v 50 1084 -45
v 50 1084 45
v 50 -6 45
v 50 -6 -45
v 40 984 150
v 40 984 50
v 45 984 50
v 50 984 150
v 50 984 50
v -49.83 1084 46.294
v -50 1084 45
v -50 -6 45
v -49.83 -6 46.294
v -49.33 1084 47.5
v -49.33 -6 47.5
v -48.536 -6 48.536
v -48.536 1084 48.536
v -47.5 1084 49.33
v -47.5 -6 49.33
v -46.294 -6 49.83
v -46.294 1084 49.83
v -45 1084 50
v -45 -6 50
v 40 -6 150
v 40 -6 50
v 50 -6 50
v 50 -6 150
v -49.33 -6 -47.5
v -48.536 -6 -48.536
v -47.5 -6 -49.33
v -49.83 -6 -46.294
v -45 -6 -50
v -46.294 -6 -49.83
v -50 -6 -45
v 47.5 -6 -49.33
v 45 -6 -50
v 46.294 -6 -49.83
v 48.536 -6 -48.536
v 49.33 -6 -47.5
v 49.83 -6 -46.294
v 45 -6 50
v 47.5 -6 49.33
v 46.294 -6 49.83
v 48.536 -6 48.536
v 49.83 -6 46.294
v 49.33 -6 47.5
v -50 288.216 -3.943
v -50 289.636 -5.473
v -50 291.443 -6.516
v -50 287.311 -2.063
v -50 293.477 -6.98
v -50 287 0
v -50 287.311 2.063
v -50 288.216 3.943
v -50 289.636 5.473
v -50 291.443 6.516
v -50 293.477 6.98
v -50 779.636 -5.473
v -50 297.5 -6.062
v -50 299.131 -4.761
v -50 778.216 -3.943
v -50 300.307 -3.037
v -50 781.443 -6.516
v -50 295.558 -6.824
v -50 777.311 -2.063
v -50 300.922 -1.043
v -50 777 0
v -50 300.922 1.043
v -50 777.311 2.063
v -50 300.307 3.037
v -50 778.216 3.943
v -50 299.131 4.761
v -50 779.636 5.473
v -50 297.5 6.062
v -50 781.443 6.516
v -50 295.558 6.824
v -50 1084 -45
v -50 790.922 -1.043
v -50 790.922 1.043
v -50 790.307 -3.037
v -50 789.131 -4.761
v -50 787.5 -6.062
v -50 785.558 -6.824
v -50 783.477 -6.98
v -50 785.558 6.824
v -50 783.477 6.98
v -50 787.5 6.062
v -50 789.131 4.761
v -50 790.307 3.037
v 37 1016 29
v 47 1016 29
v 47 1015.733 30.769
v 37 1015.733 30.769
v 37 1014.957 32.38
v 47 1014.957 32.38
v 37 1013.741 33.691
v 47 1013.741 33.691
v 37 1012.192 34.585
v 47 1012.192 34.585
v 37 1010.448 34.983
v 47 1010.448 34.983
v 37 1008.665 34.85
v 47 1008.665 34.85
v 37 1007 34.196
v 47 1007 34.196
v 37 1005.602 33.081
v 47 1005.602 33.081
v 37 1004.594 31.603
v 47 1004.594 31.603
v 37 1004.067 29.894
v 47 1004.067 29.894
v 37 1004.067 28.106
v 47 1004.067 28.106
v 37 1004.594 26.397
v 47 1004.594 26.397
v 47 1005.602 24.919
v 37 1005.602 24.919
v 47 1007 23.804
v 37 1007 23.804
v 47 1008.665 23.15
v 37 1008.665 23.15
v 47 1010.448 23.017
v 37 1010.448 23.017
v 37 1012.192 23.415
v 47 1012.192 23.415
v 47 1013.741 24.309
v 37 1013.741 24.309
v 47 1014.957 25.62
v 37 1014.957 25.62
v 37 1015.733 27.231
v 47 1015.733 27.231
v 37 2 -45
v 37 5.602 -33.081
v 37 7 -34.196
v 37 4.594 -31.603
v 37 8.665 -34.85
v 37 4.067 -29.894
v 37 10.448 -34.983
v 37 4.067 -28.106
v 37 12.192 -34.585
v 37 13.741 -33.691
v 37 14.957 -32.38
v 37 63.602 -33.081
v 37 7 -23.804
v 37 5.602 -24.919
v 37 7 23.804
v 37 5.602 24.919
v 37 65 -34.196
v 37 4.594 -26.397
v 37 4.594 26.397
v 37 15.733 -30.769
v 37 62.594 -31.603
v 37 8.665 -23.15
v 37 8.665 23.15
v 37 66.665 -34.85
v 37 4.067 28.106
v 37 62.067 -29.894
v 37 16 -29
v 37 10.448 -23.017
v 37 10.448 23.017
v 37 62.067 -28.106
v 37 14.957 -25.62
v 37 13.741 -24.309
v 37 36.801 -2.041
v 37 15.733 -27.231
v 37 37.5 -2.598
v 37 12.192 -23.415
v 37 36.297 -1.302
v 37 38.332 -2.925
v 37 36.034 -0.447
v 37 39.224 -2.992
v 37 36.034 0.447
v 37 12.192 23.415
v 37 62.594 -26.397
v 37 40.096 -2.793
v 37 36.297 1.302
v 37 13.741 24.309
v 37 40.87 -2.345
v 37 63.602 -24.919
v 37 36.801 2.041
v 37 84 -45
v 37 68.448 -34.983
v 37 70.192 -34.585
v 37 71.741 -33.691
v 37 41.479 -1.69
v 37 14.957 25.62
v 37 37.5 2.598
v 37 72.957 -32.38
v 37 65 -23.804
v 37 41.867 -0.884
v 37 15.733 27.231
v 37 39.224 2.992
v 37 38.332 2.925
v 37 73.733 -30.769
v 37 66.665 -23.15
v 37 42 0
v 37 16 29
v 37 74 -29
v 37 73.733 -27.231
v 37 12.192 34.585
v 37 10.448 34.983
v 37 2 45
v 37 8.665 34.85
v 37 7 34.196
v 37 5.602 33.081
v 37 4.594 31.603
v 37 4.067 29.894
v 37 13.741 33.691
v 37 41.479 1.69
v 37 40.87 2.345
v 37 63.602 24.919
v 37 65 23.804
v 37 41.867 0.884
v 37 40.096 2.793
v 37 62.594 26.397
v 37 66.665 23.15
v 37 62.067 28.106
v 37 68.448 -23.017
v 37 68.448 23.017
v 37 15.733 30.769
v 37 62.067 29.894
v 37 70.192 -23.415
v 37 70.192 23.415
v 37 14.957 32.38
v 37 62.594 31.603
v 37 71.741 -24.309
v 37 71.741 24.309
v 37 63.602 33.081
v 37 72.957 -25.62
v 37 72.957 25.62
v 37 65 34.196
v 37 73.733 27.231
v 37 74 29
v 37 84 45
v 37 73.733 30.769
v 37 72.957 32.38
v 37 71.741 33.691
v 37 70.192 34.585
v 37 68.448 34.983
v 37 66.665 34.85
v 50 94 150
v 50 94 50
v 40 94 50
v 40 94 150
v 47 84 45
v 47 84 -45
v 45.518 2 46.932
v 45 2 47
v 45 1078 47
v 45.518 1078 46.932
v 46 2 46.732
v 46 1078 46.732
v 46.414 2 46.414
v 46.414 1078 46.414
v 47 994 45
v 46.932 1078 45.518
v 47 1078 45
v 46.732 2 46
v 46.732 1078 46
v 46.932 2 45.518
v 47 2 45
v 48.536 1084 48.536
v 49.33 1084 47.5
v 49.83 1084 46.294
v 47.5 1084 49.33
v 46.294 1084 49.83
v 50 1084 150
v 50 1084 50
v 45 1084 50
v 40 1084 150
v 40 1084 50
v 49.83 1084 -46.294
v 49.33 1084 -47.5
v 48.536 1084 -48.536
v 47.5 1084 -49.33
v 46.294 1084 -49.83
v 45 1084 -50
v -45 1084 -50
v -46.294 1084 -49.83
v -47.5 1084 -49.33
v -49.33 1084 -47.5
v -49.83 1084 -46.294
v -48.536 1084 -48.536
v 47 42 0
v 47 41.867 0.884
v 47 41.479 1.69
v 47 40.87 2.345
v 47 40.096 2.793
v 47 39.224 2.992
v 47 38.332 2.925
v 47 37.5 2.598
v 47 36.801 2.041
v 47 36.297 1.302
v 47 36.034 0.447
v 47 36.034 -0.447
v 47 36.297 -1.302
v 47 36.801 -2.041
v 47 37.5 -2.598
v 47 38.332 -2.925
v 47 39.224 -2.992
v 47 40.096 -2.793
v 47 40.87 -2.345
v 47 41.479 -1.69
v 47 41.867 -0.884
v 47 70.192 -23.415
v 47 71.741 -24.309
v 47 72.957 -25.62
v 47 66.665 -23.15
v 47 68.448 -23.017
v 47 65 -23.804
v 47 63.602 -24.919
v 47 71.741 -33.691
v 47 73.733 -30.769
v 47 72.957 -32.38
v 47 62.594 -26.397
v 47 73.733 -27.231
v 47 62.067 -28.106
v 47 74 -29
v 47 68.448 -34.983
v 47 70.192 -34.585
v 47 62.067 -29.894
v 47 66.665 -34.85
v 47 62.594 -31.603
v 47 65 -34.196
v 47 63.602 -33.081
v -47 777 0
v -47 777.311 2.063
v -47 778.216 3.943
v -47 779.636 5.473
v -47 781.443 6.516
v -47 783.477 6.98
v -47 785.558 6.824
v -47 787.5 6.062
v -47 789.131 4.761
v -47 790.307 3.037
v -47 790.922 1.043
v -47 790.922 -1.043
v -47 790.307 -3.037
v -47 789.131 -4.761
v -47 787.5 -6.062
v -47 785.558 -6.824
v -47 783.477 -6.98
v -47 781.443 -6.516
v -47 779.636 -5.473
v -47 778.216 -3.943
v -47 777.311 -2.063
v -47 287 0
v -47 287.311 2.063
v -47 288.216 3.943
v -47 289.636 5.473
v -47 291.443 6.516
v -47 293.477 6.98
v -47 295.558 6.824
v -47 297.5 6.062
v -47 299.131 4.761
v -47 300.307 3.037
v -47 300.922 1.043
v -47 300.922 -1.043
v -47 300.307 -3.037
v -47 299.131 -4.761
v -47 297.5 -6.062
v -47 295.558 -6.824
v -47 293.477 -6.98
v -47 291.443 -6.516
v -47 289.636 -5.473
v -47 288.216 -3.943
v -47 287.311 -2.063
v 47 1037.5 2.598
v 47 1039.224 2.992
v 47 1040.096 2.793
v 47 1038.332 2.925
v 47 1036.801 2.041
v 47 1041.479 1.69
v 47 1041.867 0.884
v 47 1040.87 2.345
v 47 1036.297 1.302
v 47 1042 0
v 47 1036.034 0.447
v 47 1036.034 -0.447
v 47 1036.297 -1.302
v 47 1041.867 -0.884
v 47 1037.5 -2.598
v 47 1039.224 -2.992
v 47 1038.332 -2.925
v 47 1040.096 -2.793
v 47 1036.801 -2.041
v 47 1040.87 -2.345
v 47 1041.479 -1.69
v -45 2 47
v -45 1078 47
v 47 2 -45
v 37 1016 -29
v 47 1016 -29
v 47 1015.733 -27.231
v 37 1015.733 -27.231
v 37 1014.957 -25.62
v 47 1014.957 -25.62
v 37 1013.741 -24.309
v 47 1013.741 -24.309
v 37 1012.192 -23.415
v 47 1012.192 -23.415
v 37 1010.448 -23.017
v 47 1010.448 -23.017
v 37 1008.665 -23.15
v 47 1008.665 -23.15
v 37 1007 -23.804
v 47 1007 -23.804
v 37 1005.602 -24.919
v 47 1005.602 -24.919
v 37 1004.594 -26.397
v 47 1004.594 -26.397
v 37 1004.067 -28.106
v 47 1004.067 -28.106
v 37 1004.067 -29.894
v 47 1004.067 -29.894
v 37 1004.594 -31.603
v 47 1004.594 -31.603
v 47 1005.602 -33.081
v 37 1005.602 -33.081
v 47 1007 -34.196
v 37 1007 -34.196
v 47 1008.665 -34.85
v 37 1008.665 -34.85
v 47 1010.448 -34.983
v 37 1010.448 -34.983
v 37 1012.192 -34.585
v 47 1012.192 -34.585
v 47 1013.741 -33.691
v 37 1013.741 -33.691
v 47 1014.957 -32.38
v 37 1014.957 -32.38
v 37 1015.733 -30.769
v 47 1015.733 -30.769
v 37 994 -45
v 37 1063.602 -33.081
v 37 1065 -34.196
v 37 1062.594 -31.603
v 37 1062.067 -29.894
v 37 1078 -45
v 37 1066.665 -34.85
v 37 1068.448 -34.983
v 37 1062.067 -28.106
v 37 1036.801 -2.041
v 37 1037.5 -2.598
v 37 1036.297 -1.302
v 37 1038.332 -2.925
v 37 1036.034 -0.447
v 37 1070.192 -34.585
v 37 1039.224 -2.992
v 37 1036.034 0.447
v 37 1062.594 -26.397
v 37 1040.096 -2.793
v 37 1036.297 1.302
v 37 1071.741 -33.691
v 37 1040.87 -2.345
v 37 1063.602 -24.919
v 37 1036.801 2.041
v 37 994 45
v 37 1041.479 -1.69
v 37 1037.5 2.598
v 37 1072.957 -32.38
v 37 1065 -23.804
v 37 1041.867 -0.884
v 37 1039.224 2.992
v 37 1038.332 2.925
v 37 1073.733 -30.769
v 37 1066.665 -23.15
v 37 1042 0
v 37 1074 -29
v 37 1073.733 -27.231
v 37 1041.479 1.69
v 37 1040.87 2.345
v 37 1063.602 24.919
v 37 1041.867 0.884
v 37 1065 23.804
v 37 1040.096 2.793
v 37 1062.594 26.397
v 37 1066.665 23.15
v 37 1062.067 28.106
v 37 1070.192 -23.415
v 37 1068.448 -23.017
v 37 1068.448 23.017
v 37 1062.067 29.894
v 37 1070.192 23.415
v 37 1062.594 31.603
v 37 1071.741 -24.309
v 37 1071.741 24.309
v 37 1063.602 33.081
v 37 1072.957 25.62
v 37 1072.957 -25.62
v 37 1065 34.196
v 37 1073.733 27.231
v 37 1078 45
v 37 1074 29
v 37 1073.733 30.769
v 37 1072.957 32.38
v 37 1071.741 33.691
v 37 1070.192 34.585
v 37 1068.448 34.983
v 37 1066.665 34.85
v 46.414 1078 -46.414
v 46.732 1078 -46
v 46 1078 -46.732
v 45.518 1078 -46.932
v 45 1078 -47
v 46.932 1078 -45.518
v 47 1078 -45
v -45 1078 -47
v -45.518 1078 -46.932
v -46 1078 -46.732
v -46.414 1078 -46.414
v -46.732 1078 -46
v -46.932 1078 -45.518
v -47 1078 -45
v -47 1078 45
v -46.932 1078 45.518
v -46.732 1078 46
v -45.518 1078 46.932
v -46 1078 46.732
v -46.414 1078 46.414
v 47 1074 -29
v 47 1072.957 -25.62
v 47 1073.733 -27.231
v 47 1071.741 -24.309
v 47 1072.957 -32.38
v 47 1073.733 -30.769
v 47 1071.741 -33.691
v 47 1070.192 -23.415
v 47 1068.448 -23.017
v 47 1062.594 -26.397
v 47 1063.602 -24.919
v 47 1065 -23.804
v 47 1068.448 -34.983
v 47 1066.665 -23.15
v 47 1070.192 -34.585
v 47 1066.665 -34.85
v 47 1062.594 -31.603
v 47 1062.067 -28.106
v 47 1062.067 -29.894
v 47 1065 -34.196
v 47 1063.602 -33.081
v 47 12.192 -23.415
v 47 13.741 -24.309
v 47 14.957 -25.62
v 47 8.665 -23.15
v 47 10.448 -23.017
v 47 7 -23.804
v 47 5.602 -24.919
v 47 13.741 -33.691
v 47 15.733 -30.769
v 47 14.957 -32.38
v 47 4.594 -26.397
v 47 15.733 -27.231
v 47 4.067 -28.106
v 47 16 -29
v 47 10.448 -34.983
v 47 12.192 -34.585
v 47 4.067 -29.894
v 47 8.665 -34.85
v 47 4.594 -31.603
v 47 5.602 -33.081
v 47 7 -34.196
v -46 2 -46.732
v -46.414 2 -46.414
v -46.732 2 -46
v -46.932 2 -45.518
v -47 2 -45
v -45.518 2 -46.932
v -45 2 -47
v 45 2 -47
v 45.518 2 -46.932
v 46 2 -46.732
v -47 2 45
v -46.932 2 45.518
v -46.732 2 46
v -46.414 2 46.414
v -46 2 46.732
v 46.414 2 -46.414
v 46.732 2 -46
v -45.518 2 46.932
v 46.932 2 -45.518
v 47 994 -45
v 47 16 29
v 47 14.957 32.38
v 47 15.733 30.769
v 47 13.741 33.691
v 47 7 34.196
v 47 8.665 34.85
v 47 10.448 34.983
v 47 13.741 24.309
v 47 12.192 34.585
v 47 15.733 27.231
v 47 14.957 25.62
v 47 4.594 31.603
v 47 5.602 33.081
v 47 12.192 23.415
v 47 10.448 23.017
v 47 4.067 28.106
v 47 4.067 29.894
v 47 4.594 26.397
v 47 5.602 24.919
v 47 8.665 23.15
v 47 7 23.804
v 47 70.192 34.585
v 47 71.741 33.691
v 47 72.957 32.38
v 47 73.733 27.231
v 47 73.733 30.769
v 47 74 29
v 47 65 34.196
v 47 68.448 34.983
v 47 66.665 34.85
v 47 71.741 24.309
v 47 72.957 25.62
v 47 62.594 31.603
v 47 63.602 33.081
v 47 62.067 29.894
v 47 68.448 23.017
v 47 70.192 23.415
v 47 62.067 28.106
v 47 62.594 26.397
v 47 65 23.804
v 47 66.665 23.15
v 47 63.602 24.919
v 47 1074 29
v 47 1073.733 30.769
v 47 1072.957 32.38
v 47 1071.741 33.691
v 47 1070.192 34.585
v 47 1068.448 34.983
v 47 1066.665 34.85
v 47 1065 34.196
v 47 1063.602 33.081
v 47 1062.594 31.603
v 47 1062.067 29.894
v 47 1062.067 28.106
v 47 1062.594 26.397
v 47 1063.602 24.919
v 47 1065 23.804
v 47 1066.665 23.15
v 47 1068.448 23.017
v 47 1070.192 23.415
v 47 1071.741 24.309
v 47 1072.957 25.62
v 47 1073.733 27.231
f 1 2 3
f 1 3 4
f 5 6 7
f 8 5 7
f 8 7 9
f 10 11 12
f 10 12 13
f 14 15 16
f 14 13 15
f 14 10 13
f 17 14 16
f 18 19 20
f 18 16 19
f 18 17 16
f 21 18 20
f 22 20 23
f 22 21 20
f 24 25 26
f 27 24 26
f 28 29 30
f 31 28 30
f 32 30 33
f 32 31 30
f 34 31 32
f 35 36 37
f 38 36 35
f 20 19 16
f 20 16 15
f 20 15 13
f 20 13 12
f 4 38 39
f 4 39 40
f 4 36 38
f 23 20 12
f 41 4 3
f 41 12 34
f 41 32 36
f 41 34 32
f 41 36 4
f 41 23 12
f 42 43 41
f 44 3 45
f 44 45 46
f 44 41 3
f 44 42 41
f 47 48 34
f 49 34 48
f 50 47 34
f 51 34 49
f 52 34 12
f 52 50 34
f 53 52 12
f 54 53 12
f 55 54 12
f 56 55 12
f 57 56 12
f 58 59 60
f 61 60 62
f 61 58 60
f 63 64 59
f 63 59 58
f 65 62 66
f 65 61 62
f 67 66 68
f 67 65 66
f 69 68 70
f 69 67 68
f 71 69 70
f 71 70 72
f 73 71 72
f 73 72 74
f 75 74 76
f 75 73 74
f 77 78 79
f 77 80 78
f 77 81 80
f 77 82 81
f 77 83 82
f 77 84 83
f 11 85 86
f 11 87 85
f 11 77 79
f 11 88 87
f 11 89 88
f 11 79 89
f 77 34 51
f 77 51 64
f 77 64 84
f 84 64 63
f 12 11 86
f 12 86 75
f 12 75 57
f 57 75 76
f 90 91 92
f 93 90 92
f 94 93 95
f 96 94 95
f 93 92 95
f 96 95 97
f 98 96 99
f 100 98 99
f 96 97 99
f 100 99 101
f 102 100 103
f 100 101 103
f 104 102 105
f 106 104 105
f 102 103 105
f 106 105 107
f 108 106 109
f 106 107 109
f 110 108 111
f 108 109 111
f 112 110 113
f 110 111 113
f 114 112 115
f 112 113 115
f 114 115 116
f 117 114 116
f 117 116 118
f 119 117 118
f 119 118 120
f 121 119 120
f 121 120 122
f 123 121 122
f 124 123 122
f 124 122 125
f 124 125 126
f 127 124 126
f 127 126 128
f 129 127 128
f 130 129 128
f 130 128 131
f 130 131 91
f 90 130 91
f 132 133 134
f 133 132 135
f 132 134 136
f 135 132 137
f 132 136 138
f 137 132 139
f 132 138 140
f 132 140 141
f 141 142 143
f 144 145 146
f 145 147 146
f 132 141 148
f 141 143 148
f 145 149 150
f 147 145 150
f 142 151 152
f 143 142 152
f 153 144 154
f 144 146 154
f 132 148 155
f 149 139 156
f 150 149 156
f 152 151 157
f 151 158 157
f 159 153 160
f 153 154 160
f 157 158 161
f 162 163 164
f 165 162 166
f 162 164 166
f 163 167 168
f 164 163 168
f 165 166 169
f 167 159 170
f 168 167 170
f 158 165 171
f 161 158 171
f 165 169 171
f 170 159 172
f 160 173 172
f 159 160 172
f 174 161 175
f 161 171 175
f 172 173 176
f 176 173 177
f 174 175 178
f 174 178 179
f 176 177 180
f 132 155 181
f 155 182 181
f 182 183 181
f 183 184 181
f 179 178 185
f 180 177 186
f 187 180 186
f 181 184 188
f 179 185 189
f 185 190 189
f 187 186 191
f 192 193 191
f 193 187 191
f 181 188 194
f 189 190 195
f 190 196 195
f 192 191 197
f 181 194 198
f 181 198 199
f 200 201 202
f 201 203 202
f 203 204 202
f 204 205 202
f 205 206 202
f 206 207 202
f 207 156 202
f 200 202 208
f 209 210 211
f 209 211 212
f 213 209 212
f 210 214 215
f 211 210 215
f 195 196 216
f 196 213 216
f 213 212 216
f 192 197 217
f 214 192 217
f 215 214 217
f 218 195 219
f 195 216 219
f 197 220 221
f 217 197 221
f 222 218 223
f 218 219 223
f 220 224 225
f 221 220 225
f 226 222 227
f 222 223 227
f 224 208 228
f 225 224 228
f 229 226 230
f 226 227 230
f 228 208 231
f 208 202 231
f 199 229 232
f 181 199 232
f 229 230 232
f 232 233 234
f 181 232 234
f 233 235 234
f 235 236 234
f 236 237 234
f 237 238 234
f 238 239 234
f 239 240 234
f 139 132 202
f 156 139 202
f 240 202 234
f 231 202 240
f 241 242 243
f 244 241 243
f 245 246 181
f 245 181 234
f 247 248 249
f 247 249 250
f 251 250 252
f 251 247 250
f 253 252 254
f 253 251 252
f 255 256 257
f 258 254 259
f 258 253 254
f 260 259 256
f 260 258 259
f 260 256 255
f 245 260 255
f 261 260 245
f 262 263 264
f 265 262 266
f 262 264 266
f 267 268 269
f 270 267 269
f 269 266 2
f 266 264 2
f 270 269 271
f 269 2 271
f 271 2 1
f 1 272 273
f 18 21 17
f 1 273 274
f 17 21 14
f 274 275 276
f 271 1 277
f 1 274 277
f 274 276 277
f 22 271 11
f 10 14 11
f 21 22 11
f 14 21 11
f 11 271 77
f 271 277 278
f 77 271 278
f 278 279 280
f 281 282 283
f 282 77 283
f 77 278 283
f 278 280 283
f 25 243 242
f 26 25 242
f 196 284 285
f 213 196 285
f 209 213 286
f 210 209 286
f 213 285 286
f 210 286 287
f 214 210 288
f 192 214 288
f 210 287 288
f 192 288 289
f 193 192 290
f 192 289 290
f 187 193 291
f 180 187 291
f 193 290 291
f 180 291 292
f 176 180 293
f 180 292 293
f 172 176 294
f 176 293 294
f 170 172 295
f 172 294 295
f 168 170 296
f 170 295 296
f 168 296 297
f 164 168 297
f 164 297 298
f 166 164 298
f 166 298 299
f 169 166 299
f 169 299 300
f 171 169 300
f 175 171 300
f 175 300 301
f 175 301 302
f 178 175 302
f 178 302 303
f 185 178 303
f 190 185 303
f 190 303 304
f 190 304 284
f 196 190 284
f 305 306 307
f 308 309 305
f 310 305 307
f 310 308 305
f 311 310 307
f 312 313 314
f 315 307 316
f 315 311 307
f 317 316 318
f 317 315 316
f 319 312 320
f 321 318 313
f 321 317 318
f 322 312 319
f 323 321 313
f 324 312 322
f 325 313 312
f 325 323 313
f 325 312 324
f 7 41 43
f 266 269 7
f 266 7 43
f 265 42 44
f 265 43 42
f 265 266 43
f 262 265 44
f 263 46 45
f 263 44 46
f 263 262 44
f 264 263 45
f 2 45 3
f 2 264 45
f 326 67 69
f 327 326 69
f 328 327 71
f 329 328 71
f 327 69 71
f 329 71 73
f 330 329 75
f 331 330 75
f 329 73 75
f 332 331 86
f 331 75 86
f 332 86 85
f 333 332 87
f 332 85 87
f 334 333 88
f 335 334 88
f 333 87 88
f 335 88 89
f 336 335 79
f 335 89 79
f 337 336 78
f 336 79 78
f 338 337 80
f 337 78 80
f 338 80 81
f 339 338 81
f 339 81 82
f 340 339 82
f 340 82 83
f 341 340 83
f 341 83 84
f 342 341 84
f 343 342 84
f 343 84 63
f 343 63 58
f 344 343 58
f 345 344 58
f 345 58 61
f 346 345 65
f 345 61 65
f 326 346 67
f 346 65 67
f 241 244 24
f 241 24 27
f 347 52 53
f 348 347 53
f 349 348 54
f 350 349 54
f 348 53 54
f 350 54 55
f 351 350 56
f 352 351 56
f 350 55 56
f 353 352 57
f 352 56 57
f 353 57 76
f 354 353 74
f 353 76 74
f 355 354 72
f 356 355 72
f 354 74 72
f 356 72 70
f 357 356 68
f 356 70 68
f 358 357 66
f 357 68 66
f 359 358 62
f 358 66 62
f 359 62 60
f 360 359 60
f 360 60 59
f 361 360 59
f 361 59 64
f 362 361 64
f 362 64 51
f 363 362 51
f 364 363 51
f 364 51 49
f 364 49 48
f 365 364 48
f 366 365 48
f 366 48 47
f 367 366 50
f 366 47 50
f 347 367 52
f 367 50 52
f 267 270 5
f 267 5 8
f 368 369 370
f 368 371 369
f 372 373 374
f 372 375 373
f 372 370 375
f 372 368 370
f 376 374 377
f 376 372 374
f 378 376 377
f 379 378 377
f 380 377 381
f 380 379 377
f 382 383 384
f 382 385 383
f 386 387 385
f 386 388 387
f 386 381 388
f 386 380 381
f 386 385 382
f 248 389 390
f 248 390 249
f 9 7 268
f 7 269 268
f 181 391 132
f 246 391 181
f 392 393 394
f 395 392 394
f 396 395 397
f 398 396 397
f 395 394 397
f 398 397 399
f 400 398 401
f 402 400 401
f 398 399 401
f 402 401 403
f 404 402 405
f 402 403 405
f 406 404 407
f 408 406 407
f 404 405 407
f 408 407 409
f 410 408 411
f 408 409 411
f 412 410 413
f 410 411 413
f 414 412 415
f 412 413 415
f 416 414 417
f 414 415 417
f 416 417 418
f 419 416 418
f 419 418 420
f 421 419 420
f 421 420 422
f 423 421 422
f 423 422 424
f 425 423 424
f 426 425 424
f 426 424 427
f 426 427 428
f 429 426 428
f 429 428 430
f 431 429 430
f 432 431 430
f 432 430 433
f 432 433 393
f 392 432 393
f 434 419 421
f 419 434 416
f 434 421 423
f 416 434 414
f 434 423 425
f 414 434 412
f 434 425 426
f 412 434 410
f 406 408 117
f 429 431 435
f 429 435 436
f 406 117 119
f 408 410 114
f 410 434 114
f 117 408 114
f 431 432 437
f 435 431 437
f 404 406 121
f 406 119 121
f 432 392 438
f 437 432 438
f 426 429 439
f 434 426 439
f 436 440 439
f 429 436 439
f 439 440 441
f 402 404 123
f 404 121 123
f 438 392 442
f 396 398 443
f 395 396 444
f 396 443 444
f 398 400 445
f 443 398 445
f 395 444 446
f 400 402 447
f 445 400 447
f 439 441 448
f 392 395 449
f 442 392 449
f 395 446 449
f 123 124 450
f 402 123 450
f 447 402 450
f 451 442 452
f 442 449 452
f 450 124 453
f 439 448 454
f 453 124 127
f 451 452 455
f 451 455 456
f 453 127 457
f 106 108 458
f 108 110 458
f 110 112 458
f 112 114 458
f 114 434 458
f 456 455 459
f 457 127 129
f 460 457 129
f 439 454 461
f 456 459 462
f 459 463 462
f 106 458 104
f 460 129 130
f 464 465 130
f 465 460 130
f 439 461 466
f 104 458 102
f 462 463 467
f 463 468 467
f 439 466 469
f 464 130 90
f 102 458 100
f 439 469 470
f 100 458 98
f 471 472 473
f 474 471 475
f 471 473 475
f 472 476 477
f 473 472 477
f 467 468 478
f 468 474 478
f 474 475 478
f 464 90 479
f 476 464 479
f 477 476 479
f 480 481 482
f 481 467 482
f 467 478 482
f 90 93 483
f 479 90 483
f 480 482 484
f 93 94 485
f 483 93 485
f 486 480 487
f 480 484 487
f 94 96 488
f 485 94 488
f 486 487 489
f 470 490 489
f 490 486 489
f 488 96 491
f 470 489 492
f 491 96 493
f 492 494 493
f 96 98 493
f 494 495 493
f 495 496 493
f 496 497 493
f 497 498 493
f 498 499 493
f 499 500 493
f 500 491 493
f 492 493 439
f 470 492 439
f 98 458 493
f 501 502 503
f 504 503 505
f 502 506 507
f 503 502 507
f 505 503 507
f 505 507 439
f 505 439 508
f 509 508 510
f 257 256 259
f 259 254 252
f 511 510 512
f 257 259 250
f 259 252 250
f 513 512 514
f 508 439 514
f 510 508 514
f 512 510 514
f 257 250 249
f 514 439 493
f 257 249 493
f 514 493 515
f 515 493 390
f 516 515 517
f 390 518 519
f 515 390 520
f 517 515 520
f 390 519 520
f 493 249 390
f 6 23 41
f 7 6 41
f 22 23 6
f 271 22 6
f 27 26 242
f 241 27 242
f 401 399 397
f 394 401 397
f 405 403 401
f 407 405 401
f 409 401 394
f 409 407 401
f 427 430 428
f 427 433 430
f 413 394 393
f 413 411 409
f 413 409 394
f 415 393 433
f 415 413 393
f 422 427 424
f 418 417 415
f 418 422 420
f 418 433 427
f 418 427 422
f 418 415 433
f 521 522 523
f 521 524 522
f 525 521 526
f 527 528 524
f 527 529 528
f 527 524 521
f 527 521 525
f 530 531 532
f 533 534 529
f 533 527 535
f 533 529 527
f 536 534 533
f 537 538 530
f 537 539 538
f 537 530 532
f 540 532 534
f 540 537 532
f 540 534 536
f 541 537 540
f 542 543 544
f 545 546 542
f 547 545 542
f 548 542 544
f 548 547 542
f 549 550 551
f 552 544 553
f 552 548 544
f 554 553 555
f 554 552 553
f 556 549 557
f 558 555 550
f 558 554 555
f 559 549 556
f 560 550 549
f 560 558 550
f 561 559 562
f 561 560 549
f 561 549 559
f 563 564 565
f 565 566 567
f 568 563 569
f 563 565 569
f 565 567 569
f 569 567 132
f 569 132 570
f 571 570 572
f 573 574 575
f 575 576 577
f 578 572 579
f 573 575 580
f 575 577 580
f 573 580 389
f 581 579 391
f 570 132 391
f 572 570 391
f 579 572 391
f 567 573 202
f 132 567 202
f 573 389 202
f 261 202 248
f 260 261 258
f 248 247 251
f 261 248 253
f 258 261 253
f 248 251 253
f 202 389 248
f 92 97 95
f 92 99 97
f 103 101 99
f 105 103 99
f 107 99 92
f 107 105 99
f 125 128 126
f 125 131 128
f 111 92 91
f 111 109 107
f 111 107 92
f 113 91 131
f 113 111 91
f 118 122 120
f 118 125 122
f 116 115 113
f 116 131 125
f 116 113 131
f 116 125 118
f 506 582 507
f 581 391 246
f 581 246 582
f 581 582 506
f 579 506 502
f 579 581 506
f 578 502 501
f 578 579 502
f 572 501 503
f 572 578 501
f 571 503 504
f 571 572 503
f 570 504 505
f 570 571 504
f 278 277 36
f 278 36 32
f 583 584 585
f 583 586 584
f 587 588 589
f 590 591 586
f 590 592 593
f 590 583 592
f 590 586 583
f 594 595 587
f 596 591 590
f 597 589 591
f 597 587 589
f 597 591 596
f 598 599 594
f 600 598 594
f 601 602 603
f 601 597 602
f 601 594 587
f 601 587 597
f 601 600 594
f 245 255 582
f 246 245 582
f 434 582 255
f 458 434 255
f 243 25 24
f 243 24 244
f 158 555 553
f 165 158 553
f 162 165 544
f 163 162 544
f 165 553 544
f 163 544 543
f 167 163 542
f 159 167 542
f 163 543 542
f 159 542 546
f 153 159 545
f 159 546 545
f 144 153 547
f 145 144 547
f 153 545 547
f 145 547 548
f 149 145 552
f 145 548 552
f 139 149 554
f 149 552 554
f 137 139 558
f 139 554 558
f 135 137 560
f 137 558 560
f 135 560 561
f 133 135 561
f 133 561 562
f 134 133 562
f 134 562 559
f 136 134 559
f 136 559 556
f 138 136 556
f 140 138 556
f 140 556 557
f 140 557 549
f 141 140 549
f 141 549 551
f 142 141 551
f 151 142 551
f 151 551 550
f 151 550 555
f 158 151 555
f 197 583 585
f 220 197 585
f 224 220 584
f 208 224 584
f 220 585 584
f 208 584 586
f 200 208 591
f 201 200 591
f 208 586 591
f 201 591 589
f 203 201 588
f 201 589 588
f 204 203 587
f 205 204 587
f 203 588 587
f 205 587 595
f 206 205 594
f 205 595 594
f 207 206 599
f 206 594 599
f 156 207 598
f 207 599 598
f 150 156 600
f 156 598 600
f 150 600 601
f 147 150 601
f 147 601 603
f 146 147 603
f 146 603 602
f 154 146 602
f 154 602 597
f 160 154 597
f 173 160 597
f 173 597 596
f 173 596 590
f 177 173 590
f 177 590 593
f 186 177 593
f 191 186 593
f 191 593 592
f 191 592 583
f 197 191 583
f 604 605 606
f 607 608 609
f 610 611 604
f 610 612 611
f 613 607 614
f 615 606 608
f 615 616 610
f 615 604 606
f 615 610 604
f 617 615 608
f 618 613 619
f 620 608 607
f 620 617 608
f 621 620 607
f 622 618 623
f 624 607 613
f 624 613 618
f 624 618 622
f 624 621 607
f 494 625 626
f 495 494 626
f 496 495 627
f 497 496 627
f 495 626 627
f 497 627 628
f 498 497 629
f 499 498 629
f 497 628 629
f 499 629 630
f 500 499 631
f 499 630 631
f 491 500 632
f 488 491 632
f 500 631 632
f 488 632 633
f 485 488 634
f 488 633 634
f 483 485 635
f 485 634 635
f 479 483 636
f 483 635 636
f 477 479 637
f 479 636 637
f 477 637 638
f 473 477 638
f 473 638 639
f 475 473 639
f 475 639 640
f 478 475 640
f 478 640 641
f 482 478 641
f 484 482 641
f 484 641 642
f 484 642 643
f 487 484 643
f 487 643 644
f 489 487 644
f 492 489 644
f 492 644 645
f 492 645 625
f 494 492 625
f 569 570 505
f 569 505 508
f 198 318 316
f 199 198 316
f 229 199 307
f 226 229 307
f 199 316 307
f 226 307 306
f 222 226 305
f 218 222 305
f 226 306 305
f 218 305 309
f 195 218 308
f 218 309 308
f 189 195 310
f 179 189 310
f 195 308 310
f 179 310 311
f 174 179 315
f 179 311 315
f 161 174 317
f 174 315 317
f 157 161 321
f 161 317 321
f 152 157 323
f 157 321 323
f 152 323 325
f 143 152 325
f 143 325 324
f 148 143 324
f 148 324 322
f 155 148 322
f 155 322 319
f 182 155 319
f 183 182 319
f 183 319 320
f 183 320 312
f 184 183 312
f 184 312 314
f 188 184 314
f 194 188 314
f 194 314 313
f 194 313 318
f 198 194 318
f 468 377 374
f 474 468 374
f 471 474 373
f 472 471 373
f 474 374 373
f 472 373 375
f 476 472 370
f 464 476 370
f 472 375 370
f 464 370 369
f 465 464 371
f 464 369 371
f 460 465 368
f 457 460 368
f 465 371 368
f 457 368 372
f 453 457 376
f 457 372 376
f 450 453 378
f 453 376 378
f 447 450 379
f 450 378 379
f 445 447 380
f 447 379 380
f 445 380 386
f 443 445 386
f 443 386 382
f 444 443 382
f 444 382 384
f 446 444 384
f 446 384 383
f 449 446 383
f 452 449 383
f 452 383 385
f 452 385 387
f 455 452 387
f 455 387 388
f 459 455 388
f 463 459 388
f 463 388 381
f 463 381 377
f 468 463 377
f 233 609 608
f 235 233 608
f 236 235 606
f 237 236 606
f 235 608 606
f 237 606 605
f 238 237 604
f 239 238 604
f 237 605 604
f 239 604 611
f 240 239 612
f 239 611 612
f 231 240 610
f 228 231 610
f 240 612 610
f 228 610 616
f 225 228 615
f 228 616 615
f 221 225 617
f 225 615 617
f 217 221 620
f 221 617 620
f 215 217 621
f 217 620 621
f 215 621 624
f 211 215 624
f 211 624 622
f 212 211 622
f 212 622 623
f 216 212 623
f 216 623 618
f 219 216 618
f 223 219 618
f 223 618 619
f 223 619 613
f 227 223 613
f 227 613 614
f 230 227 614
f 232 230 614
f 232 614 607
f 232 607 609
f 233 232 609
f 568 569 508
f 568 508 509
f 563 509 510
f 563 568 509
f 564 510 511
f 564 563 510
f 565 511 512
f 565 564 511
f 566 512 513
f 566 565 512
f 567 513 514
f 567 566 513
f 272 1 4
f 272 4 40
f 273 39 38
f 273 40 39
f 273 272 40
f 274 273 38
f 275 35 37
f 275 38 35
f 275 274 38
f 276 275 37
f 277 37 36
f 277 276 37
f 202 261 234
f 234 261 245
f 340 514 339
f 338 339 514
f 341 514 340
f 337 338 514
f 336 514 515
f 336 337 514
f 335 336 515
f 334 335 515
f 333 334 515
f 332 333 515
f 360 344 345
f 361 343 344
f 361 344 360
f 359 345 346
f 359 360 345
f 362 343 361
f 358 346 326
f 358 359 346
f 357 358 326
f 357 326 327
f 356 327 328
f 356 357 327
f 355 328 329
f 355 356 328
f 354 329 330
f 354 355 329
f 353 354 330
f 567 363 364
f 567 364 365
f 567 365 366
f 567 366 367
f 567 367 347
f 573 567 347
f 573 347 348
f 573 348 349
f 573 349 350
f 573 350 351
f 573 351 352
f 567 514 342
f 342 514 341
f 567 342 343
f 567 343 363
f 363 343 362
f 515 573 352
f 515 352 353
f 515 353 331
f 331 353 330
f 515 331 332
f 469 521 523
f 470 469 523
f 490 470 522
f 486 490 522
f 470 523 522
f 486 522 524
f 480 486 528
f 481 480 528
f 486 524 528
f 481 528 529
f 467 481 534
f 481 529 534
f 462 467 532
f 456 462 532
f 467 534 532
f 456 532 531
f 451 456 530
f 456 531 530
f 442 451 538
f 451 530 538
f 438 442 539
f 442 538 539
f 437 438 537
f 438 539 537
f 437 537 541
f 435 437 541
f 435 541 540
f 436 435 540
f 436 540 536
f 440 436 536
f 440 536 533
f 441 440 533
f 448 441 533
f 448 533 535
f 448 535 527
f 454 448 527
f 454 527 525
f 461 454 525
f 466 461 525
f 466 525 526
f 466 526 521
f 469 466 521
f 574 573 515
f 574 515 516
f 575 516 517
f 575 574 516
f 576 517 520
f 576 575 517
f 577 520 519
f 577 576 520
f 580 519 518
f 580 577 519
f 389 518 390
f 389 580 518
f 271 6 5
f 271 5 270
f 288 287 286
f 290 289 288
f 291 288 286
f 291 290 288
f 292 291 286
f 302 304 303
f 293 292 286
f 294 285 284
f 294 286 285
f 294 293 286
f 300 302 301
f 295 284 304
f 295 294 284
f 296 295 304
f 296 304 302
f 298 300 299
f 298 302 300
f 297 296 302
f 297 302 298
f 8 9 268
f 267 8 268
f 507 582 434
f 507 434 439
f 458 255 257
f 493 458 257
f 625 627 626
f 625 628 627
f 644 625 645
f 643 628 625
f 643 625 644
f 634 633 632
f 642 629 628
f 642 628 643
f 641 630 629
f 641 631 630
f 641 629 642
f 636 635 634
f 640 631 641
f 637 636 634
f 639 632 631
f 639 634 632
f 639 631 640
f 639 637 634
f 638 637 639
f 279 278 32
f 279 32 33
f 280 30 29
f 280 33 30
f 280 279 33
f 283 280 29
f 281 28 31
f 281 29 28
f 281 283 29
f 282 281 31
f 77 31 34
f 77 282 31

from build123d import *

# Parameters (mm, degrees)
F1_DEPTH  = 1078
F4_DEPTH  = 8
F7_DEPTH  = 6
F9_R      = 7
F10_DEPTH = 3
F11_W     = 90
F11_H     = 90
F11_R     = 6
F11_R_2   = 3
F12_DEPTH = 13
F13_W     = 5
F13_H     = 100
F14_DEPTH = 100


with BuildPart() as f1:
    # F0 (on Front) → F1 (new body)
    with BuildSketch(Plane.XZ):
        with BuildLine():
            ThreePointArc((50, 45), (48.5355339059, 48.5355339059), (45, 50))
            Line((45, 50), (-45, 50))
            ThreePointArc((-45, 50), (-48.5355339059, 48.5355339059), (-50, 45))
            Line((-50, 45), (-50, -45))
            ThreePointArc((-50, -45), (-48.5355339059, -48.5355339059), (-45, -50))
            Line((-45, -50), (45, -50))
            ThreePointArc((45, -50), (48.5355339059, -48.5355339059), (50, -45))
            Line((50, -45), (50, 45))
        make_face()
        with BuildLine():
            ThreePointArc((-47, 45), (-46.4142135624, 46.4142135624), (-45, 47))
            Line((-45, 47), (45, 47))
            ThreePointArc((45, 47), (46.4142135624, 46.4142135624), (47, 45))
            Line((47, 45), (47, -45))
            ThreePointArc((47, -45), (46.4142135624, -46.4142135624), (45, -47))
            Line((45, -47), (-45, -47))
            ThreePointArc((-45, -47), (-46.4142135624, -46.4142135624), (-47, -45))
            Line((-47, -45), (-47, 45))
        make_face(mode=Mode.SUBTRACT)
    extrude(amount=-F1_DEPTH)

    # F3 (on offset) → F4 (join)
    with BuildSketch(Plane.XZ.offset(6)):
        with BuildLine():
            ThreePointArc((50, 45), (48.5355339059, 48.5355339059), (45, 50))
            Line((45, 50), (-45, 50))
            ThreePointArc((-45, 50), (-48.5355339059, 48.5355339059), (-50, 45))
            Line((-50, 45), (-50, -45))
            ThreePointArc((-50, -45), (-48.5355339059, -48.5355339059), (-45, -50))
            Line((-45, -50), (45, -50))
            ThreePointArc((45, -50), (48.5355339059, -48.5355339059), (50, -45))
            Line((50, -45), (50, 45))
        make_face()
    extrude(amount=-F4_DEPTH)

    # F6 (on offset) → F7 (join)
    with BuildSketch(Plane(origin=(0, 1084, 0), x_dir=(-1, 0, 0), z_dir=(0, 1, 0))):
        with BuildLine():
            ThreePointArc((50, 45), (48.5355339059, 48.5355339059), (45, 50))
            Line((45, 50), (-45, 50))
            ThreePointArc((-45, 50), (-48.5355339059, 48.5355339059), (-50, 45))
            Line((-50, 45), (-50, -45))
            ThreePointArc((-50, -45), (-48.5355339059, -48.5355339059), (-45, -50))
            Line((-45, -50), (45, -50))
            ThreePointArc((45, -50), (48.5355339059, -48.5355339059), (50, -45))
            Line((50, -45), (50, 45))
        make_face()
    extrude(amount=-F7_DEPTH)

    # F8: union 

    # F9 (on face) → F10 (cut, through all)
    with BuildSketch(Plane(origin=(-50, 0, 0), x_dir=(0, -1, 0), z_dir=(-1, 0, 0))):
        with Locations((-784, 0)):
            Circle(F9_R)
        with Locations((-294, 0)):
            Circle(F9_R)
    extrude(amount=-F10_DEPTH, mode=Mode.SUBTRACT)

    # F11 (on face) → F12 (join)
    with BuildSketch(Plane.YZ.offset(50)):
        with Locations((1039, 0)):
            Rectangle(F11_W, F11_H)
        with Locations((1010, -29)):
            Circle(F11_R, mode=Mode.SUBTRACT)
        with Locations((1068, -29)):
            Circle(F11_R, mode=Mode.SUBTRACT)
        with Locations((1039, 0)):
            Circle(F11_R_2, mode=Mode.SUBTRACT)
        with Locations((1010, 29)):
            Circle(F11_R, mode=Mode.SUBTRACT)
        with Locations((1068, 29)):
            Circle(F11_R, mode=Mode.SUBTRACT)
        with Locations((39, 0)):
            Rectangle(F11_W, F11_H)
        with Locations((10, -29)):
            Circle(F11_R, mode=Mode.SUBTRACT)
        with Locations((68, -29)):
            Circle(F11_R, mode=Mode.SUBTRACT)
        with Locations((39, 0)):
            Circle(F11_R_2, mode=Mode.SUBTRACT)
        with Locations((10, 29)):
            Circle(F11_R, mode=Mode.SUBTRACT)
        with Locations((68, 29)):
            Circle(F11_R, mode=Mode.SUBTRACT)
    extrude(amount=-F12_DEPTH)

    # F13 (on face) → F14 (join)
    with BuildSketch(Plane.XY.offset(50)):
        with Locations((47.5, 1034)):
            Rectangle(F13_W, F13_H)
        with Locations((42.5, 1034)):
            Rectangle(F13_W, F13_H)
    extrude(amount=F14_DEPTH)


with BuildPart() as f14:
    # F13 (on face) → F14, piece 2 (new body)
    with BuildSketch(Plane.XY.offset(50)):
        with Locations((47.5, 44)):
            Rectangle(F13_W, F13_H)
        with Locations((42.5, 44)):
            Rectangle(F13_W, F13_H)
    extrude(amount=F14_DEPTH)


solid = Compound([f1.part, f14.part])
